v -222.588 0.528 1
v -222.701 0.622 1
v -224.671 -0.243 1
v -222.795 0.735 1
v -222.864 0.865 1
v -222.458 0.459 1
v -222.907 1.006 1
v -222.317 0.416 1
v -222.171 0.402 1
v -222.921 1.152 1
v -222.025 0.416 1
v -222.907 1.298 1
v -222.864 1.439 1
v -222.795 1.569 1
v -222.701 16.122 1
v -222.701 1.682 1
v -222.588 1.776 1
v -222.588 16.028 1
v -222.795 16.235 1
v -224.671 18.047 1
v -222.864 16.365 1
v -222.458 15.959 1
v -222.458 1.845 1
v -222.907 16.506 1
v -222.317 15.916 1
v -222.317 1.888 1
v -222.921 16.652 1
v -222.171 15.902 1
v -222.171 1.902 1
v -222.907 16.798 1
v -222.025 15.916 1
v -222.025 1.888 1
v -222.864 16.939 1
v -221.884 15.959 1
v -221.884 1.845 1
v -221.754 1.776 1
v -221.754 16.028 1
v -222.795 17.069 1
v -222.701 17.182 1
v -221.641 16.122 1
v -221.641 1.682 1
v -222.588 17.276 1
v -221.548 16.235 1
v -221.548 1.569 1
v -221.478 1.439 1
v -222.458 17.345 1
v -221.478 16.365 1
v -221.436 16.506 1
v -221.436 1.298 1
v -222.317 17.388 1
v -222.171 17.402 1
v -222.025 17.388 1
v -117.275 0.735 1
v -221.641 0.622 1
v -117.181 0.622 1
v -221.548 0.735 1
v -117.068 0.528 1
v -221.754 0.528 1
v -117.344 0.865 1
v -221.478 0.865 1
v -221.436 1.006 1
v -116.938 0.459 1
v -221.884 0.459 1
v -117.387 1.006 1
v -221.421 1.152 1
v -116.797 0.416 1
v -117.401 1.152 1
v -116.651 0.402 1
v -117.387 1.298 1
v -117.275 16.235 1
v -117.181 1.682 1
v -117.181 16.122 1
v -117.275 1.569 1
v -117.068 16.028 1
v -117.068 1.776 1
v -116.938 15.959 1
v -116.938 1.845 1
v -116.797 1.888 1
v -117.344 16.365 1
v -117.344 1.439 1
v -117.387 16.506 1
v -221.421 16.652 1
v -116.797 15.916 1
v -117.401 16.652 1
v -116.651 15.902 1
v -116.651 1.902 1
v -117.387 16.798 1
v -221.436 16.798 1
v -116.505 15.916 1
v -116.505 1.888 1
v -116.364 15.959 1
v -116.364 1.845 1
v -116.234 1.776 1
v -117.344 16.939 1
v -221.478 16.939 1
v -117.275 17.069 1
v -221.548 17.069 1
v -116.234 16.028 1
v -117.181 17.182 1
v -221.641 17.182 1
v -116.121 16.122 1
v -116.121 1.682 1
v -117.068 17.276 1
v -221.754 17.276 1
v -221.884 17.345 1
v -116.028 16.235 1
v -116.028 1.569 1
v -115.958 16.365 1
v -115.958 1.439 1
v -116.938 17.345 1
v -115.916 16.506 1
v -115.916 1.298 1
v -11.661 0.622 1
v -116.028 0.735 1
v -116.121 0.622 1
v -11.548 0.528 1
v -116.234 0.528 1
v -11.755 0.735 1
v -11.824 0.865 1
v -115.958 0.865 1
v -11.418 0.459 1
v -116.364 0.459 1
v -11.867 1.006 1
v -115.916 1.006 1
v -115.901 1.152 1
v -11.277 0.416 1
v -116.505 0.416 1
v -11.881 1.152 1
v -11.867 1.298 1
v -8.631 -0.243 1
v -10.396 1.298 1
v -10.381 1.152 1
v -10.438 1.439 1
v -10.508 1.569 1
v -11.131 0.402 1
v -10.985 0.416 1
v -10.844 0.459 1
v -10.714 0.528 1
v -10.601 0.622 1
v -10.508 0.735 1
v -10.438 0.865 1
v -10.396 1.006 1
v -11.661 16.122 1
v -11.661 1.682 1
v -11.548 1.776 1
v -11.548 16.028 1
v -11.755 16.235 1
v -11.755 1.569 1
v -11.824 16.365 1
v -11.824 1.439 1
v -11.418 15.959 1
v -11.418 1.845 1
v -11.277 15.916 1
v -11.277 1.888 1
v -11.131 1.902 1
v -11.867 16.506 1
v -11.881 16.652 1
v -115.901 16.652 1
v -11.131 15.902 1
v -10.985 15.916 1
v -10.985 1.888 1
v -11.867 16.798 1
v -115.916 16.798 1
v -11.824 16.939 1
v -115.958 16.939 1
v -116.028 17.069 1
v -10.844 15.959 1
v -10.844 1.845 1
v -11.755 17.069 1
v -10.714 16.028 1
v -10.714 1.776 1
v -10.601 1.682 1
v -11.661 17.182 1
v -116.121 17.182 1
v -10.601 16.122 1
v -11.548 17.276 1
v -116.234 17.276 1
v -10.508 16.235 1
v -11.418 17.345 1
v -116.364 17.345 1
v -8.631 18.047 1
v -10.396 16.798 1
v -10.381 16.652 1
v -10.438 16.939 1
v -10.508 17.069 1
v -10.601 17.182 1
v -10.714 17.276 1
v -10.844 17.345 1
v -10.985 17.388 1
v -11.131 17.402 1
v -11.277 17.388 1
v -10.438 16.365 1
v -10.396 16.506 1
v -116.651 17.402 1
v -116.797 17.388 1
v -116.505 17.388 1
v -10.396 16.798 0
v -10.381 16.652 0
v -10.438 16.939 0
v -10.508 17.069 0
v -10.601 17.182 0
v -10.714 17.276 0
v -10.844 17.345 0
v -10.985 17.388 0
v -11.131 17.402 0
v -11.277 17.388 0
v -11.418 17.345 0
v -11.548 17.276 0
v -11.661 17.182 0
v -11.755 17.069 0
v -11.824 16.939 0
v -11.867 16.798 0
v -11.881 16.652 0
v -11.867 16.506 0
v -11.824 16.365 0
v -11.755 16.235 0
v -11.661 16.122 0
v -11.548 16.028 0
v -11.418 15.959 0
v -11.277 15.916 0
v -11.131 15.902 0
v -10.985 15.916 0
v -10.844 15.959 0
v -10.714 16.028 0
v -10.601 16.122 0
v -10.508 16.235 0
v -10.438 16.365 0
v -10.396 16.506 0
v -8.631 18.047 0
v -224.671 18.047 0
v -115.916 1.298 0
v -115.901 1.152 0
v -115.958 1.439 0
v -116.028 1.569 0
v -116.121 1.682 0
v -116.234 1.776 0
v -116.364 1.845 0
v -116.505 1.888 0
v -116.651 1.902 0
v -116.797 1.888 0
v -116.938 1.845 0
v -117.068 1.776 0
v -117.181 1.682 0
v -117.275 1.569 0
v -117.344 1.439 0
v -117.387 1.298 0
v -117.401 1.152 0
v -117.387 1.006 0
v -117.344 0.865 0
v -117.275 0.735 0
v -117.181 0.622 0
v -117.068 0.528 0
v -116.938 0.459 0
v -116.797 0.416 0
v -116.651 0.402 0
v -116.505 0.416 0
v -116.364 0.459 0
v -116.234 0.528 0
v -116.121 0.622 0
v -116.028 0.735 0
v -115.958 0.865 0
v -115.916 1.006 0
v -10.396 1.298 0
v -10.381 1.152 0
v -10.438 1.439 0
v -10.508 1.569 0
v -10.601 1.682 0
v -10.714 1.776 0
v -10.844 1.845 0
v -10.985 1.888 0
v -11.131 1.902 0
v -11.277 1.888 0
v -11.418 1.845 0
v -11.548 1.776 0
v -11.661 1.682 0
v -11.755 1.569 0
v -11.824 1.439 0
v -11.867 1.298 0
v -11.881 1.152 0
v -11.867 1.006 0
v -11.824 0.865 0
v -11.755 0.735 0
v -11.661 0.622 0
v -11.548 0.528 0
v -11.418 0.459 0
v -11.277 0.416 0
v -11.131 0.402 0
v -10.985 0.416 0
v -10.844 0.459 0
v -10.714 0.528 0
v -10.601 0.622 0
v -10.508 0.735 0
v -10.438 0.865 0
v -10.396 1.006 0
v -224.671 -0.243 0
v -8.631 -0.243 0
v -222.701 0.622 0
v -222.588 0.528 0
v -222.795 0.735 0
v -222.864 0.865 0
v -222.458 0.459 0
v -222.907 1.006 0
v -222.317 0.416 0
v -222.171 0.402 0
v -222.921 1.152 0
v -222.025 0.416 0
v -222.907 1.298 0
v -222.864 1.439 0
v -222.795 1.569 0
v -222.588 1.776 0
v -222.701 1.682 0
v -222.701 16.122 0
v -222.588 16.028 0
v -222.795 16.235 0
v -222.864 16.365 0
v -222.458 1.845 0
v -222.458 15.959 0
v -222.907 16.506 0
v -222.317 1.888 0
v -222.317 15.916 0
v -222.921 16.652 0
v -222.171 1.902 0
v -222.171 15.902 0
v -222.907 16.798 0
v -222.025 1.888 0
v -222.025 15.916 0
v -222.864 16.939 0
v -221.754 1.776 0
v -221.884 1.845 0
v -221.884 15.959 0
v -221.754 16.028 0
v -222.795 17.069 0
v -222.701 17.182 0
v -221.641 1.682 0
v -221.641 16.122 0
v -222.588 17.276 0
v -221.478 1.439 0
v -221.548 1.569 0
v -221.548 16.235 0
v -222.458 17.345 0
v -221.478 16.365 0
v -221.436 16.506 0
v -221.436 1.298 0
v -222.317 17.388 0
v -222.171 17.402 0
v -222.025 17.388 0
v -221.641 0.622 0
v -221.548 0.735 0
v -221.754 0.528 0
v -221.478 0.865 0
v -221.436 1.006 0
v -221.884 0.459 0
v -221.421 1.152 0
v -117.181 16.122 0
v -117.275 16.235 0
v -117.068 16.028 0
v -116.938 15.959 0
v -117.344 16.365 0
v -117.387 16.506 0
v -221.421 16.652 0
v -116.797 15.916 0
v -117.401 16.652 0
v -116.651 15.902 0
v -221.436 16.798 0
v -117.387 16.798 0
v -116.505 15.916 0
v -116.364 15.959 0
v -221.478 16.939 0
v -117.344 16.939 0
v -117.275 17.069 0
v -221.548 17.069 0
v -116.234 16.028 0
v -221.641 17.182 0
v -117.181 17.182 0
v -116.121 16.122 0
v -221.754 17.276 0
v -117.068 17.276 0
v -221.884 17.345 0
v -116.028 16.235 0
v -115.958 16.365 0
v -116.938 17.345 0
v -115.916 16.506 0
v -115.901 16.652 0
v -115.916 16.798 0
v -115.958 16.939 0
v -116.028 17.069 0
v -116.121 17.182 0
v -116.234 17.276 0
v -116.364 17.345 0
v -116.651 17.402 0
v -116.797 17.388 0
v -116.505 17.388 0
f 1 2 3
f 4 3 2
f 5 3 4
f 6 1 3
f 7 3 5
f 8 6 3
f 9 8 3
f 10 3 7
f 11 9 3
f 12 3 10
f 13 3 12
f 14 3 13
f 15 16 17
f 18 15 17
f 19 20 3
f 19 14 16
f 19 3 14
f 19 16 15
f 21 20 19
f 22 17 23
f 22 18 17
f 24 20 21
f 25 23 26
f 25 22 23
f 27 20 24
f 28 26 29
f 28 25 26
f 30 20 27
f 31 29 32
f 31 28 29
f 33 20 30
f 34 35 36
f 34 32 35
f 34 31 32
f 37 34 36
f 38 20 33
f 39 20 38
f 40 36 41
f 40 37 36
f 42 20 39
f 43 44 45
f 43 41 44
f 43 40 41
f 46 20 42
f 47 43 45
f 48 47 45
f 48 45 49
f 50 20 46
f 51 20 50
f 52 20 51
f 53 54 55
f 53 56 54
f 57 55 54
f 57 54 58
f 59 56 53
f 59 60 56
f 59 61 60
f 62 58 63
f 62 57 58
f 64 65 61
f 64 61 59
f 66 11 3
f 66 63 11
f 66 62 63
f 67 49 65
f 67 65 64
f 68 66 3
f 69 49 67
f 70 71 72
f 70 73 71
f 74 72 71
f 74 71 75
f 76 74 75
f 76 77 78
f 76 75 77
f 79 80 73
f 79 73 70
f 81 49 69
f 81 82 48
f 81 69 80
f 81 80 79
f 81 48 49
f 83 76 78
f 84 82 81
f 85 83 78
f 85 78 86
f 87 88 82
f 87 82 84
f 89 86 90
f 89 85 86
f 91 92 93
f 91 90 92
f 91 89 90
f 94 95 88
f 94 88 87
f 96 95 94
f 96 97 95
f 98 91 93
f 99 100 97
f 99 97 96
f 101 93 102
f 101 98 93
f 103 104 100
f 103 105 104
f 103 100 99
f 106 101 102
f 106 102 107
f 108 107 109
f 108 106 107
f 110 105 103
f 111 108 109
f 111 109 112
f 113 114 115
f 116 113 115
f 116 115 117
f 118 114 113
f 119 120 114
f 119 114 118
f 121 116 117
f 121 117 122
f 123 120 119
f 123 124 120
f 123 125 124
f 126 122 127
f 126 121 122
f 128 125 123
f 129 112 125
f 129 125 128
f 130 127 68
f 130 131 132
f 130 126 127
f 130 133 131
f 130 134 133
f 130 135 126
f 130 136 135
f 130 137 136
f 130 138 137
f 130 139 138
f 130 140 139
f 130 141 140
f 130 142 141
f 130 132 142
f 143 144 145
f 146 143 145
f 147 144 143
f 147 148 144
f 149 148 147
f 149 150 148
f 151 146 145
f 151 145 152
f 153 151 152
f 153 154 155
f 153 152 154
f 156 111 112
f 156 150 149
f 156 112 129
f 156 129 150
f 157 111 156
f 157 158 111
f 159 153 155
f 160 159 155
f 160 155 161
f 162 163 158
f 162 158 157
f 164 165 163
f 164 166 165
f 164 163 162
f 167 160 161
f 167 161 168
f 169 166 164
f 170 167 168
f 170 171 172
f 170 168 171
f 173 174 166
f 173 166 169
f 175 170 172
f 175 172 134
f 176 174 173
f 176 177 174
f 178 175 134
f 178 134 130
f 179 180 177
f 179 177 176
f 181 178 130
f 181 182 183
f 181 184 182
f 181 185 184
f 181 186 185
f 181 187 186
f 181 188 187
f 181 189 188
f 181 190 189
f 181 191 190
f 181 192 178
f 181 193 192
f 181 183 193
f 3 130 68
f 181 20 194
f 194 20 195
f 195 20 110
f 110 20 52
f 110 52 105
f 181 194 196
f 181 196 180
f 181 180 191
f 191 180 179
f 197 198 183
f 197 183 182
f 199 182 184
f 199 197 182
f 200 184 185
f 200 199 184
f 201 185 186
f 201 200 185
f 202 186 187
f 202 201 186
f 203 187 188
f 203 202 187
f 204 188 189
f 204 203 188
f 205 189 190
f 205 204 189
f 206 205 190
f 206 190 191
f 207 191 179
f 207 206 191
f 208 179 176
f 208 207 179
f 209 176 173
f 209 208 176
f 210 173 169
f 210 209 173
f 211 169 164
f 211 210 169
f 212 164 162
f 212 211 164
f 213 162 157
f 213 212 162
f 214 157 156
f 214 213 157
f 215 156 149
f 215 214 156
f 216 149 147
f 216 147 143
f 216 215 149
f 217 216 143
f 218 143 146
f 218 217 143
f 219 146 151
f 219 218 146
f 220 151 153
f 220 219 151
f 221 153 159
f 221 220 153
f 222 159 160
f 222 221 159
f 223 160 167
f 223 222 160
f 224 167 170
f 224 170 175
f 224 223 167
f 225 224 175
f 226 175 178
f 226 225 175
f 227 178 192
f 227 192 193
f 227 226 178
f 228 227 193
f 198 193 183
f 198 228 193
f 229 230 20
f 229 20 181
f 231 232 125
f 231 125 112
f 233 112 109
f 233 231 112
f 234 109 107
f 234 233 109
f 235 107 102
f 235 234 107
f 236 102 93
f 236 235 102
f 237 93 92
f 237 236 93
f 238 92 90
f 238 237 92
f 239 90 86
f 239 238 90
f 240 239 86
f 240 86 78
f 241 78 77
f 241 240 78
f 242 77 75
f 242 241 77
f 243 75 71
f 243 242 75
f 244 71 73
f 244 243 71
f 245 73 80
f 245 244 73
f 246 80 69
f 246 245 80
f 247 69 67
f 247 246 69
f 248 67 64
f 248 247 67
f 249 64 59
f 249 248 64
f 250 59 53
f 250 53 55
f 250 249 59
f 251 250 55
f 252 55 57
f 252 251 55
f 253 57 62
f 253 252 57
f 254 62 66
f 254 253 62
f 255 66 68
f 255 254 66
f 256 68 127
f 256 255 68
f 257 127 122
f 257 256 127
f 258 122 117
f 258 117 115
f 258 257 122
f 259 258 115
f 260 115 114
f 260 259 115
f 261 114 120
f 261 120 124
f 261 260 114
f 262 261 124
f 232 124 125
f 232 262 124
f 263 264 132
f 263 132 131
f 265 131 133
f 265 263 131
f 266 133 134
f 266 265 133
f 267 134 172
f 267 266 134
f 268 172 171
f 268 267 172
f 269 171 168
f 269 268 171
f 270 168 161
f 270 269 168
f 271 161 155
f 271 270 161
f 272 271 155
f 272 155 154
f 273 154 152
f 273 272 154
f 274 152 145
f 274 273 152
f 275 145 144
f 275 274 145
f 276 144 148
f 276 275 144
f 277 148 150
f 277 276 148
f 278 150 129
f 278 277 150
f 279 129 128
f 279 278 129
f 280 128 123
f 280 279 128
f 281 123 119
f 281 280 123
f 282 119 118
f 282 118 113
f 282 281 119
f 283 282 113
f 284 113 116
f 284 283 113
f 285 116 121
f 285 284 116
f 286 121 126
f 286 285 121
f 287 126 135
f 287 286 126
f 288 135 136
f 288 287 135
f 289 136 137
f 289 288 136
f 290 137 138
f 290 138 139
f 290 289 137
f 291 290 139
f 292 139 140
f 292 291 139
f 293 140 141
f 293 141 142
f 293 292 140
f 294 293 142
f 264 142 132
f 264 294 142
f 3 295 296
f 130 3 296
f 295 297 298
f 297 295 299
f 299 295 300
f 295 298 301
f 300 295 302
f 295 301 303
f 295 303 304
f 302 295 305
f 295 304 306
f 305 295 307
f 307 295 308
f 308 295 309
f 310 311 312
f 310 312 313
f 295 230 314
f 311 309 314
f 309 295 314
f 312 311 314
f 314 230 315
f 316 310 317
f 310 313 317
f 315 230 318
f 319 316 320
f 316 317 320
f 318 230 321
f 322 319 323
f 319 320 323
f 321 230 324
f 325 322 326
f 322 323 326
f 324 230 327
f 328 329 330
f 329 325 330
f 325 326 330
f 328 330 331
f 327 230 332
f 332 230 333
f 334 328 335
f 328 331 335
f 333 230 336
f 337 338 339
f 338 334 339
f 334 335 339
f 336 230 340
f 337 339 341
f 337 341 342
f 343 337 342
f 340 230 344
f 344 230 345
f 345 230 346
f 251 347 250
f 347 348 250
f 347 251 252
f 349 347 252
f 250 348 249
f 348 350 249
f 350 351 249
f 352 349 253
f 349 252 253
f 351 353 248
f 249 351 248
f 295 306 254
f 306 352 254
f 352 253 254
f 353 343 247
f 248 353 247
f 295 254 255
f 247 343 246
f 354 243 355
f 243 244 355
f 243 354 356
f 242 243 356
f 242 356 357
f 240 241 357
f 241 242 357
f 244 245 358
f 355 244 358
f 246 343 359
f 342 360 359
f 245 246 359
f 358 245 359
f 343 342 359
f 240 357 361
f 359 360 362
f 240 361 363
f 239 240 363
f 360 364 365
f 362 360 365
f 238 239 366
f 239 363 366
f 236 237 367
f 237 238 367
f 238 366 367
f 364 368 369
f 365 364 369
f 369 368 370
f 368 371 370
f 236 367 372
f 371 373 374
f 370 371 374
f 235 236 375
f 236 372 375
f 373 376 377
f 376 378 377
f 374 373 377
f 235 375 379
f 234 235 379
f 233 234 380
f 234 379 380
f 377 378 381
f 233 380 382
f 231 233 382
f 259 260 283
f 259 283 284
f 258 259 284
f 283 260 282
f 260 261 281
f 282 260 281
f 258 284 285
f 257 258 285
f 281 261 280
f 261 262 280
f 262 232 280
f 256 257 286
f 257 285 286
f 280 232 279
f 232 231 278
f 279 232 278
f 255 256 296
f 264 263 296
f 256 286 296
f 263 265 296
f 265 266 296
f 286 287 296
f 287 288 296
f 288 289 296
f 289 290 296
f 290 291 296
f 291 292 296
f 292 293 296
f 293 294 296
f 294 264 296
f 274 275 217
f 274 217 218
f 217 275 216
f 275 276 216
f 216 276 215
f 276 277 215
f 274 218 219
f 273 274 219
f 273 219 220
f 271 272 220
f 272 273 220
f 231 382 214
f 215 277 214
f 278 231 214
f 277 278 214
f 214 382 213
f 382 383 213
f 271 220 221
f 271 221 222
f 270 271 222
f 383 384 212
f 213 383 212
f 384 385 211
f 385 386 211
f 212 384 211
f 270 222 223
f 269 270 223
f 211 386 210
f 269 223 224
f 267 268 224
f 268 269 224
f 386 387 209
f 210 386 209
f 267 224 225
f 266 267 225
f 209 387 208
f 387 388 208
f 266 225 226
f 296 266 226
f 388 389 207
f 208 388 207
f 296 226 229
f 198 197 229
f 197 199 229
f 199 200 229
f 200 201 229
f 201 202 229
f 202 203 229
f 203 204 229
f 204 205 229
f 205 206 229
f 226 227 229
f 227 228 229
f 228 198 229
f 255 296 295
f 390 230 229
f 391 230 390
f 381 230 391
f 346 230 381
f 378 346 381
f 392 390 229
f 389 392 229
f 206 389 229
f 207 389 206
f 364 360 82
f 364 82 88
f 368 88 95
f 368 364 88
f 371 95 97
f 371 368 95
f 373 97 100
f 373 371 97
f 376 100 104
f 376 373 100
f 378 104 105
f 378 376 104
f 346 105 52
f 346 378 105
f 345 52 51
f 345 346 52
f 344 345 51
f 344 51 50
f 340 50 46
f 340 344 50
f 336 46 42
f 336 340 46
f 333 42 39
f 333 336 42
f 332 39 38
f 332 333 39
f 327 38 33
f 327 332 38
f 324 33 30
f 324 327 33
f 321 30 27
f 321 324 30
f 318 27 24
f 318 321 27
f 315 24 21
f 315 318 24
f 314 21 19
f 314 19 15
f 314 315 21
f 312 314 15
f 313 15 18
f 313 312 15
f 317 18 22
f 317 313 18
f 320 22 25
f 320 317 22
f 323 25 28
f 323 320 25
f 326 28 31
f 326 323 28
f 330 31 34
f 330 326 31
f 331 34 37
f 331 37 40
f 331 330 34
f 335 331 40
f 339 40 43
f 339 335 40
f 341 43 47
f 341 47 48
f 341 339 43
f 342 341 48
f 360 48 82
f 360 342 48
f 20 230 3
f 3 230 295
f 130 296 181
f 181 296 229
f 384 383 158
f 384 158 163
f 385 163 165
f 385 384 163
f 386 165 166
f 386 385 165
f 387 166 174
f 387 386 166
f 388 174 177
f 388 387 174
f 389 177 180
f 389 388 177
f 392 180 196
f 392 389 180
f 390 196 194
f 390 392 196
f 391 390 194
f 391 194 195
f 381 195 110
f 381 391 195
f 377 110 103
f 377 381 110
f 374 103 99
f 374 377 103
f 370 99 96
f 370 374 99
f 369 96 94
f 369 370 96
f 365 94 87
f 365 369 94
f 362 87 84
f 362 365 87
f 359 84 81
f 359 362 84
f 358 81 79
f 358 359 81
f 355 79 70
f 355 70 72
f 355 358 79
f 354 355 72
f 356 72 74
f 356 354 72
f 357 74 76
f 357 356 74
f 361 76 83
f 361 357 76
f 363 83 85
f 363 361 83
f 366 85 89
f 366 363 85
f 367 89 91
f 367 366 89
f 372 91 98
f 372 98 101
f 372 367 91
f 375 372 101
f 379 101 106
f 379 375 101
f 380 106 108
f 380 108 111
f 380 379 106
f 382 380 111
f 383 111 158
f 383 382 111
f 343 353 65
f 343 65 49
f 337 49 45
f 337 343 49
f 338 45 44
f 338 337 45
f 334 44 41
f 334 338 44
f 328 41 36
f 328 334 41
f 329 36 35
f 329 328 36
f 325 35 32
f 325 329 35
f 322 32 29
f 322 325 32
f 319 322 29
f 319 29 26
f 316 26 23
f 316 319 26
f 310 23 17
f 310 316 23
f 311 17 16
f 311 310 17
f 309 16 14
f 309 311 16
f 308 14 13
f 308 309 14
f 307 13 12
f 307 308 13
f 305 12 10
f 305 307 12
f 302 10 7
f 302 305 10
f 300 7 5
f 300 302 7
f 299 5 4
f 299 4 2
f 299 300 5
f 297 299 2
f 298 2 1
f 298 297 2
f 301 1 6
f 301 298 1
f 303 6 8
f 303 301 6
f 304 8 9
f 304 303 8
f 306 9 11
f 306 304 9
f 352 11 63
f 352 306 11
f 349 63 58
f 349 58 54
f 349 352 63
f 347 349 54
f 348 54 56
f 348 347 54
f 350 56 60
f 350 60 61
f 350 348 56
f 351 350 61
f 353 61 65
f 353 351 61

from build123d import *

# Parameters (mm, degrees)
SKETCH1_W           = 216.04
SKETCH1_H           = 6.355
SKETCH1_H_2         = 2.79
SKETCH1_R           = 0.75
BOSS_EXTRUDE1_DEPTH = 1


with BuildPart() as part:
    # Sketch1 → Boss-Extrude1 (new body)
    with BuildSketch(Plane.XY):
        with Locations((-116.651138015, 12.079424939)):
            Rectangle(SKETCH1_W, SKETCH1_H)
        with Locations((-116.651138015, 16.651924939)):
            Rectangle(SKETCH1_W, SKETCH1_H_2)
        with Locations((-222.171138015, 16.651924939)):
            Circle(SKETCH1_R, mode=Mode.SUBTRACT)
        with Locations((-116.651138015, 16.651924939)):
            Circle(SKETCH1_R, mode=Mode.SUBTRACT)
        with Locations((-11.131138015, 16.651924939)):
            Circle(SKETCH1_R, mode=Mode.SUBTRACT)
        with Locations((-116.651138015, 5.724424939)):
            Rectangle(SKETCH1_W, SKETCH1_H)
        with Locations((-116.651138015, 1.151924939)):
            Rectangle(SKETCH1_W, SKETCH1_H_2)
        with Locations((-222.171138015, 1.151924939)):
            Circle(SKETCH1_R, mode=Mode.SUBTRACT)
        with Locations((-116.651138015, 1.151924939)):
            Circle(SKETCH1_R, mode=Mode.SUBTRACT)
        with Locations((-11.131138015, 1.151924939)):
            Circle(SKETCH1_R, mode=Mode.SUBTRACT)
    extrude(amount=BOSS_EXTRUDE1_DEPTH)


solid = part.part
